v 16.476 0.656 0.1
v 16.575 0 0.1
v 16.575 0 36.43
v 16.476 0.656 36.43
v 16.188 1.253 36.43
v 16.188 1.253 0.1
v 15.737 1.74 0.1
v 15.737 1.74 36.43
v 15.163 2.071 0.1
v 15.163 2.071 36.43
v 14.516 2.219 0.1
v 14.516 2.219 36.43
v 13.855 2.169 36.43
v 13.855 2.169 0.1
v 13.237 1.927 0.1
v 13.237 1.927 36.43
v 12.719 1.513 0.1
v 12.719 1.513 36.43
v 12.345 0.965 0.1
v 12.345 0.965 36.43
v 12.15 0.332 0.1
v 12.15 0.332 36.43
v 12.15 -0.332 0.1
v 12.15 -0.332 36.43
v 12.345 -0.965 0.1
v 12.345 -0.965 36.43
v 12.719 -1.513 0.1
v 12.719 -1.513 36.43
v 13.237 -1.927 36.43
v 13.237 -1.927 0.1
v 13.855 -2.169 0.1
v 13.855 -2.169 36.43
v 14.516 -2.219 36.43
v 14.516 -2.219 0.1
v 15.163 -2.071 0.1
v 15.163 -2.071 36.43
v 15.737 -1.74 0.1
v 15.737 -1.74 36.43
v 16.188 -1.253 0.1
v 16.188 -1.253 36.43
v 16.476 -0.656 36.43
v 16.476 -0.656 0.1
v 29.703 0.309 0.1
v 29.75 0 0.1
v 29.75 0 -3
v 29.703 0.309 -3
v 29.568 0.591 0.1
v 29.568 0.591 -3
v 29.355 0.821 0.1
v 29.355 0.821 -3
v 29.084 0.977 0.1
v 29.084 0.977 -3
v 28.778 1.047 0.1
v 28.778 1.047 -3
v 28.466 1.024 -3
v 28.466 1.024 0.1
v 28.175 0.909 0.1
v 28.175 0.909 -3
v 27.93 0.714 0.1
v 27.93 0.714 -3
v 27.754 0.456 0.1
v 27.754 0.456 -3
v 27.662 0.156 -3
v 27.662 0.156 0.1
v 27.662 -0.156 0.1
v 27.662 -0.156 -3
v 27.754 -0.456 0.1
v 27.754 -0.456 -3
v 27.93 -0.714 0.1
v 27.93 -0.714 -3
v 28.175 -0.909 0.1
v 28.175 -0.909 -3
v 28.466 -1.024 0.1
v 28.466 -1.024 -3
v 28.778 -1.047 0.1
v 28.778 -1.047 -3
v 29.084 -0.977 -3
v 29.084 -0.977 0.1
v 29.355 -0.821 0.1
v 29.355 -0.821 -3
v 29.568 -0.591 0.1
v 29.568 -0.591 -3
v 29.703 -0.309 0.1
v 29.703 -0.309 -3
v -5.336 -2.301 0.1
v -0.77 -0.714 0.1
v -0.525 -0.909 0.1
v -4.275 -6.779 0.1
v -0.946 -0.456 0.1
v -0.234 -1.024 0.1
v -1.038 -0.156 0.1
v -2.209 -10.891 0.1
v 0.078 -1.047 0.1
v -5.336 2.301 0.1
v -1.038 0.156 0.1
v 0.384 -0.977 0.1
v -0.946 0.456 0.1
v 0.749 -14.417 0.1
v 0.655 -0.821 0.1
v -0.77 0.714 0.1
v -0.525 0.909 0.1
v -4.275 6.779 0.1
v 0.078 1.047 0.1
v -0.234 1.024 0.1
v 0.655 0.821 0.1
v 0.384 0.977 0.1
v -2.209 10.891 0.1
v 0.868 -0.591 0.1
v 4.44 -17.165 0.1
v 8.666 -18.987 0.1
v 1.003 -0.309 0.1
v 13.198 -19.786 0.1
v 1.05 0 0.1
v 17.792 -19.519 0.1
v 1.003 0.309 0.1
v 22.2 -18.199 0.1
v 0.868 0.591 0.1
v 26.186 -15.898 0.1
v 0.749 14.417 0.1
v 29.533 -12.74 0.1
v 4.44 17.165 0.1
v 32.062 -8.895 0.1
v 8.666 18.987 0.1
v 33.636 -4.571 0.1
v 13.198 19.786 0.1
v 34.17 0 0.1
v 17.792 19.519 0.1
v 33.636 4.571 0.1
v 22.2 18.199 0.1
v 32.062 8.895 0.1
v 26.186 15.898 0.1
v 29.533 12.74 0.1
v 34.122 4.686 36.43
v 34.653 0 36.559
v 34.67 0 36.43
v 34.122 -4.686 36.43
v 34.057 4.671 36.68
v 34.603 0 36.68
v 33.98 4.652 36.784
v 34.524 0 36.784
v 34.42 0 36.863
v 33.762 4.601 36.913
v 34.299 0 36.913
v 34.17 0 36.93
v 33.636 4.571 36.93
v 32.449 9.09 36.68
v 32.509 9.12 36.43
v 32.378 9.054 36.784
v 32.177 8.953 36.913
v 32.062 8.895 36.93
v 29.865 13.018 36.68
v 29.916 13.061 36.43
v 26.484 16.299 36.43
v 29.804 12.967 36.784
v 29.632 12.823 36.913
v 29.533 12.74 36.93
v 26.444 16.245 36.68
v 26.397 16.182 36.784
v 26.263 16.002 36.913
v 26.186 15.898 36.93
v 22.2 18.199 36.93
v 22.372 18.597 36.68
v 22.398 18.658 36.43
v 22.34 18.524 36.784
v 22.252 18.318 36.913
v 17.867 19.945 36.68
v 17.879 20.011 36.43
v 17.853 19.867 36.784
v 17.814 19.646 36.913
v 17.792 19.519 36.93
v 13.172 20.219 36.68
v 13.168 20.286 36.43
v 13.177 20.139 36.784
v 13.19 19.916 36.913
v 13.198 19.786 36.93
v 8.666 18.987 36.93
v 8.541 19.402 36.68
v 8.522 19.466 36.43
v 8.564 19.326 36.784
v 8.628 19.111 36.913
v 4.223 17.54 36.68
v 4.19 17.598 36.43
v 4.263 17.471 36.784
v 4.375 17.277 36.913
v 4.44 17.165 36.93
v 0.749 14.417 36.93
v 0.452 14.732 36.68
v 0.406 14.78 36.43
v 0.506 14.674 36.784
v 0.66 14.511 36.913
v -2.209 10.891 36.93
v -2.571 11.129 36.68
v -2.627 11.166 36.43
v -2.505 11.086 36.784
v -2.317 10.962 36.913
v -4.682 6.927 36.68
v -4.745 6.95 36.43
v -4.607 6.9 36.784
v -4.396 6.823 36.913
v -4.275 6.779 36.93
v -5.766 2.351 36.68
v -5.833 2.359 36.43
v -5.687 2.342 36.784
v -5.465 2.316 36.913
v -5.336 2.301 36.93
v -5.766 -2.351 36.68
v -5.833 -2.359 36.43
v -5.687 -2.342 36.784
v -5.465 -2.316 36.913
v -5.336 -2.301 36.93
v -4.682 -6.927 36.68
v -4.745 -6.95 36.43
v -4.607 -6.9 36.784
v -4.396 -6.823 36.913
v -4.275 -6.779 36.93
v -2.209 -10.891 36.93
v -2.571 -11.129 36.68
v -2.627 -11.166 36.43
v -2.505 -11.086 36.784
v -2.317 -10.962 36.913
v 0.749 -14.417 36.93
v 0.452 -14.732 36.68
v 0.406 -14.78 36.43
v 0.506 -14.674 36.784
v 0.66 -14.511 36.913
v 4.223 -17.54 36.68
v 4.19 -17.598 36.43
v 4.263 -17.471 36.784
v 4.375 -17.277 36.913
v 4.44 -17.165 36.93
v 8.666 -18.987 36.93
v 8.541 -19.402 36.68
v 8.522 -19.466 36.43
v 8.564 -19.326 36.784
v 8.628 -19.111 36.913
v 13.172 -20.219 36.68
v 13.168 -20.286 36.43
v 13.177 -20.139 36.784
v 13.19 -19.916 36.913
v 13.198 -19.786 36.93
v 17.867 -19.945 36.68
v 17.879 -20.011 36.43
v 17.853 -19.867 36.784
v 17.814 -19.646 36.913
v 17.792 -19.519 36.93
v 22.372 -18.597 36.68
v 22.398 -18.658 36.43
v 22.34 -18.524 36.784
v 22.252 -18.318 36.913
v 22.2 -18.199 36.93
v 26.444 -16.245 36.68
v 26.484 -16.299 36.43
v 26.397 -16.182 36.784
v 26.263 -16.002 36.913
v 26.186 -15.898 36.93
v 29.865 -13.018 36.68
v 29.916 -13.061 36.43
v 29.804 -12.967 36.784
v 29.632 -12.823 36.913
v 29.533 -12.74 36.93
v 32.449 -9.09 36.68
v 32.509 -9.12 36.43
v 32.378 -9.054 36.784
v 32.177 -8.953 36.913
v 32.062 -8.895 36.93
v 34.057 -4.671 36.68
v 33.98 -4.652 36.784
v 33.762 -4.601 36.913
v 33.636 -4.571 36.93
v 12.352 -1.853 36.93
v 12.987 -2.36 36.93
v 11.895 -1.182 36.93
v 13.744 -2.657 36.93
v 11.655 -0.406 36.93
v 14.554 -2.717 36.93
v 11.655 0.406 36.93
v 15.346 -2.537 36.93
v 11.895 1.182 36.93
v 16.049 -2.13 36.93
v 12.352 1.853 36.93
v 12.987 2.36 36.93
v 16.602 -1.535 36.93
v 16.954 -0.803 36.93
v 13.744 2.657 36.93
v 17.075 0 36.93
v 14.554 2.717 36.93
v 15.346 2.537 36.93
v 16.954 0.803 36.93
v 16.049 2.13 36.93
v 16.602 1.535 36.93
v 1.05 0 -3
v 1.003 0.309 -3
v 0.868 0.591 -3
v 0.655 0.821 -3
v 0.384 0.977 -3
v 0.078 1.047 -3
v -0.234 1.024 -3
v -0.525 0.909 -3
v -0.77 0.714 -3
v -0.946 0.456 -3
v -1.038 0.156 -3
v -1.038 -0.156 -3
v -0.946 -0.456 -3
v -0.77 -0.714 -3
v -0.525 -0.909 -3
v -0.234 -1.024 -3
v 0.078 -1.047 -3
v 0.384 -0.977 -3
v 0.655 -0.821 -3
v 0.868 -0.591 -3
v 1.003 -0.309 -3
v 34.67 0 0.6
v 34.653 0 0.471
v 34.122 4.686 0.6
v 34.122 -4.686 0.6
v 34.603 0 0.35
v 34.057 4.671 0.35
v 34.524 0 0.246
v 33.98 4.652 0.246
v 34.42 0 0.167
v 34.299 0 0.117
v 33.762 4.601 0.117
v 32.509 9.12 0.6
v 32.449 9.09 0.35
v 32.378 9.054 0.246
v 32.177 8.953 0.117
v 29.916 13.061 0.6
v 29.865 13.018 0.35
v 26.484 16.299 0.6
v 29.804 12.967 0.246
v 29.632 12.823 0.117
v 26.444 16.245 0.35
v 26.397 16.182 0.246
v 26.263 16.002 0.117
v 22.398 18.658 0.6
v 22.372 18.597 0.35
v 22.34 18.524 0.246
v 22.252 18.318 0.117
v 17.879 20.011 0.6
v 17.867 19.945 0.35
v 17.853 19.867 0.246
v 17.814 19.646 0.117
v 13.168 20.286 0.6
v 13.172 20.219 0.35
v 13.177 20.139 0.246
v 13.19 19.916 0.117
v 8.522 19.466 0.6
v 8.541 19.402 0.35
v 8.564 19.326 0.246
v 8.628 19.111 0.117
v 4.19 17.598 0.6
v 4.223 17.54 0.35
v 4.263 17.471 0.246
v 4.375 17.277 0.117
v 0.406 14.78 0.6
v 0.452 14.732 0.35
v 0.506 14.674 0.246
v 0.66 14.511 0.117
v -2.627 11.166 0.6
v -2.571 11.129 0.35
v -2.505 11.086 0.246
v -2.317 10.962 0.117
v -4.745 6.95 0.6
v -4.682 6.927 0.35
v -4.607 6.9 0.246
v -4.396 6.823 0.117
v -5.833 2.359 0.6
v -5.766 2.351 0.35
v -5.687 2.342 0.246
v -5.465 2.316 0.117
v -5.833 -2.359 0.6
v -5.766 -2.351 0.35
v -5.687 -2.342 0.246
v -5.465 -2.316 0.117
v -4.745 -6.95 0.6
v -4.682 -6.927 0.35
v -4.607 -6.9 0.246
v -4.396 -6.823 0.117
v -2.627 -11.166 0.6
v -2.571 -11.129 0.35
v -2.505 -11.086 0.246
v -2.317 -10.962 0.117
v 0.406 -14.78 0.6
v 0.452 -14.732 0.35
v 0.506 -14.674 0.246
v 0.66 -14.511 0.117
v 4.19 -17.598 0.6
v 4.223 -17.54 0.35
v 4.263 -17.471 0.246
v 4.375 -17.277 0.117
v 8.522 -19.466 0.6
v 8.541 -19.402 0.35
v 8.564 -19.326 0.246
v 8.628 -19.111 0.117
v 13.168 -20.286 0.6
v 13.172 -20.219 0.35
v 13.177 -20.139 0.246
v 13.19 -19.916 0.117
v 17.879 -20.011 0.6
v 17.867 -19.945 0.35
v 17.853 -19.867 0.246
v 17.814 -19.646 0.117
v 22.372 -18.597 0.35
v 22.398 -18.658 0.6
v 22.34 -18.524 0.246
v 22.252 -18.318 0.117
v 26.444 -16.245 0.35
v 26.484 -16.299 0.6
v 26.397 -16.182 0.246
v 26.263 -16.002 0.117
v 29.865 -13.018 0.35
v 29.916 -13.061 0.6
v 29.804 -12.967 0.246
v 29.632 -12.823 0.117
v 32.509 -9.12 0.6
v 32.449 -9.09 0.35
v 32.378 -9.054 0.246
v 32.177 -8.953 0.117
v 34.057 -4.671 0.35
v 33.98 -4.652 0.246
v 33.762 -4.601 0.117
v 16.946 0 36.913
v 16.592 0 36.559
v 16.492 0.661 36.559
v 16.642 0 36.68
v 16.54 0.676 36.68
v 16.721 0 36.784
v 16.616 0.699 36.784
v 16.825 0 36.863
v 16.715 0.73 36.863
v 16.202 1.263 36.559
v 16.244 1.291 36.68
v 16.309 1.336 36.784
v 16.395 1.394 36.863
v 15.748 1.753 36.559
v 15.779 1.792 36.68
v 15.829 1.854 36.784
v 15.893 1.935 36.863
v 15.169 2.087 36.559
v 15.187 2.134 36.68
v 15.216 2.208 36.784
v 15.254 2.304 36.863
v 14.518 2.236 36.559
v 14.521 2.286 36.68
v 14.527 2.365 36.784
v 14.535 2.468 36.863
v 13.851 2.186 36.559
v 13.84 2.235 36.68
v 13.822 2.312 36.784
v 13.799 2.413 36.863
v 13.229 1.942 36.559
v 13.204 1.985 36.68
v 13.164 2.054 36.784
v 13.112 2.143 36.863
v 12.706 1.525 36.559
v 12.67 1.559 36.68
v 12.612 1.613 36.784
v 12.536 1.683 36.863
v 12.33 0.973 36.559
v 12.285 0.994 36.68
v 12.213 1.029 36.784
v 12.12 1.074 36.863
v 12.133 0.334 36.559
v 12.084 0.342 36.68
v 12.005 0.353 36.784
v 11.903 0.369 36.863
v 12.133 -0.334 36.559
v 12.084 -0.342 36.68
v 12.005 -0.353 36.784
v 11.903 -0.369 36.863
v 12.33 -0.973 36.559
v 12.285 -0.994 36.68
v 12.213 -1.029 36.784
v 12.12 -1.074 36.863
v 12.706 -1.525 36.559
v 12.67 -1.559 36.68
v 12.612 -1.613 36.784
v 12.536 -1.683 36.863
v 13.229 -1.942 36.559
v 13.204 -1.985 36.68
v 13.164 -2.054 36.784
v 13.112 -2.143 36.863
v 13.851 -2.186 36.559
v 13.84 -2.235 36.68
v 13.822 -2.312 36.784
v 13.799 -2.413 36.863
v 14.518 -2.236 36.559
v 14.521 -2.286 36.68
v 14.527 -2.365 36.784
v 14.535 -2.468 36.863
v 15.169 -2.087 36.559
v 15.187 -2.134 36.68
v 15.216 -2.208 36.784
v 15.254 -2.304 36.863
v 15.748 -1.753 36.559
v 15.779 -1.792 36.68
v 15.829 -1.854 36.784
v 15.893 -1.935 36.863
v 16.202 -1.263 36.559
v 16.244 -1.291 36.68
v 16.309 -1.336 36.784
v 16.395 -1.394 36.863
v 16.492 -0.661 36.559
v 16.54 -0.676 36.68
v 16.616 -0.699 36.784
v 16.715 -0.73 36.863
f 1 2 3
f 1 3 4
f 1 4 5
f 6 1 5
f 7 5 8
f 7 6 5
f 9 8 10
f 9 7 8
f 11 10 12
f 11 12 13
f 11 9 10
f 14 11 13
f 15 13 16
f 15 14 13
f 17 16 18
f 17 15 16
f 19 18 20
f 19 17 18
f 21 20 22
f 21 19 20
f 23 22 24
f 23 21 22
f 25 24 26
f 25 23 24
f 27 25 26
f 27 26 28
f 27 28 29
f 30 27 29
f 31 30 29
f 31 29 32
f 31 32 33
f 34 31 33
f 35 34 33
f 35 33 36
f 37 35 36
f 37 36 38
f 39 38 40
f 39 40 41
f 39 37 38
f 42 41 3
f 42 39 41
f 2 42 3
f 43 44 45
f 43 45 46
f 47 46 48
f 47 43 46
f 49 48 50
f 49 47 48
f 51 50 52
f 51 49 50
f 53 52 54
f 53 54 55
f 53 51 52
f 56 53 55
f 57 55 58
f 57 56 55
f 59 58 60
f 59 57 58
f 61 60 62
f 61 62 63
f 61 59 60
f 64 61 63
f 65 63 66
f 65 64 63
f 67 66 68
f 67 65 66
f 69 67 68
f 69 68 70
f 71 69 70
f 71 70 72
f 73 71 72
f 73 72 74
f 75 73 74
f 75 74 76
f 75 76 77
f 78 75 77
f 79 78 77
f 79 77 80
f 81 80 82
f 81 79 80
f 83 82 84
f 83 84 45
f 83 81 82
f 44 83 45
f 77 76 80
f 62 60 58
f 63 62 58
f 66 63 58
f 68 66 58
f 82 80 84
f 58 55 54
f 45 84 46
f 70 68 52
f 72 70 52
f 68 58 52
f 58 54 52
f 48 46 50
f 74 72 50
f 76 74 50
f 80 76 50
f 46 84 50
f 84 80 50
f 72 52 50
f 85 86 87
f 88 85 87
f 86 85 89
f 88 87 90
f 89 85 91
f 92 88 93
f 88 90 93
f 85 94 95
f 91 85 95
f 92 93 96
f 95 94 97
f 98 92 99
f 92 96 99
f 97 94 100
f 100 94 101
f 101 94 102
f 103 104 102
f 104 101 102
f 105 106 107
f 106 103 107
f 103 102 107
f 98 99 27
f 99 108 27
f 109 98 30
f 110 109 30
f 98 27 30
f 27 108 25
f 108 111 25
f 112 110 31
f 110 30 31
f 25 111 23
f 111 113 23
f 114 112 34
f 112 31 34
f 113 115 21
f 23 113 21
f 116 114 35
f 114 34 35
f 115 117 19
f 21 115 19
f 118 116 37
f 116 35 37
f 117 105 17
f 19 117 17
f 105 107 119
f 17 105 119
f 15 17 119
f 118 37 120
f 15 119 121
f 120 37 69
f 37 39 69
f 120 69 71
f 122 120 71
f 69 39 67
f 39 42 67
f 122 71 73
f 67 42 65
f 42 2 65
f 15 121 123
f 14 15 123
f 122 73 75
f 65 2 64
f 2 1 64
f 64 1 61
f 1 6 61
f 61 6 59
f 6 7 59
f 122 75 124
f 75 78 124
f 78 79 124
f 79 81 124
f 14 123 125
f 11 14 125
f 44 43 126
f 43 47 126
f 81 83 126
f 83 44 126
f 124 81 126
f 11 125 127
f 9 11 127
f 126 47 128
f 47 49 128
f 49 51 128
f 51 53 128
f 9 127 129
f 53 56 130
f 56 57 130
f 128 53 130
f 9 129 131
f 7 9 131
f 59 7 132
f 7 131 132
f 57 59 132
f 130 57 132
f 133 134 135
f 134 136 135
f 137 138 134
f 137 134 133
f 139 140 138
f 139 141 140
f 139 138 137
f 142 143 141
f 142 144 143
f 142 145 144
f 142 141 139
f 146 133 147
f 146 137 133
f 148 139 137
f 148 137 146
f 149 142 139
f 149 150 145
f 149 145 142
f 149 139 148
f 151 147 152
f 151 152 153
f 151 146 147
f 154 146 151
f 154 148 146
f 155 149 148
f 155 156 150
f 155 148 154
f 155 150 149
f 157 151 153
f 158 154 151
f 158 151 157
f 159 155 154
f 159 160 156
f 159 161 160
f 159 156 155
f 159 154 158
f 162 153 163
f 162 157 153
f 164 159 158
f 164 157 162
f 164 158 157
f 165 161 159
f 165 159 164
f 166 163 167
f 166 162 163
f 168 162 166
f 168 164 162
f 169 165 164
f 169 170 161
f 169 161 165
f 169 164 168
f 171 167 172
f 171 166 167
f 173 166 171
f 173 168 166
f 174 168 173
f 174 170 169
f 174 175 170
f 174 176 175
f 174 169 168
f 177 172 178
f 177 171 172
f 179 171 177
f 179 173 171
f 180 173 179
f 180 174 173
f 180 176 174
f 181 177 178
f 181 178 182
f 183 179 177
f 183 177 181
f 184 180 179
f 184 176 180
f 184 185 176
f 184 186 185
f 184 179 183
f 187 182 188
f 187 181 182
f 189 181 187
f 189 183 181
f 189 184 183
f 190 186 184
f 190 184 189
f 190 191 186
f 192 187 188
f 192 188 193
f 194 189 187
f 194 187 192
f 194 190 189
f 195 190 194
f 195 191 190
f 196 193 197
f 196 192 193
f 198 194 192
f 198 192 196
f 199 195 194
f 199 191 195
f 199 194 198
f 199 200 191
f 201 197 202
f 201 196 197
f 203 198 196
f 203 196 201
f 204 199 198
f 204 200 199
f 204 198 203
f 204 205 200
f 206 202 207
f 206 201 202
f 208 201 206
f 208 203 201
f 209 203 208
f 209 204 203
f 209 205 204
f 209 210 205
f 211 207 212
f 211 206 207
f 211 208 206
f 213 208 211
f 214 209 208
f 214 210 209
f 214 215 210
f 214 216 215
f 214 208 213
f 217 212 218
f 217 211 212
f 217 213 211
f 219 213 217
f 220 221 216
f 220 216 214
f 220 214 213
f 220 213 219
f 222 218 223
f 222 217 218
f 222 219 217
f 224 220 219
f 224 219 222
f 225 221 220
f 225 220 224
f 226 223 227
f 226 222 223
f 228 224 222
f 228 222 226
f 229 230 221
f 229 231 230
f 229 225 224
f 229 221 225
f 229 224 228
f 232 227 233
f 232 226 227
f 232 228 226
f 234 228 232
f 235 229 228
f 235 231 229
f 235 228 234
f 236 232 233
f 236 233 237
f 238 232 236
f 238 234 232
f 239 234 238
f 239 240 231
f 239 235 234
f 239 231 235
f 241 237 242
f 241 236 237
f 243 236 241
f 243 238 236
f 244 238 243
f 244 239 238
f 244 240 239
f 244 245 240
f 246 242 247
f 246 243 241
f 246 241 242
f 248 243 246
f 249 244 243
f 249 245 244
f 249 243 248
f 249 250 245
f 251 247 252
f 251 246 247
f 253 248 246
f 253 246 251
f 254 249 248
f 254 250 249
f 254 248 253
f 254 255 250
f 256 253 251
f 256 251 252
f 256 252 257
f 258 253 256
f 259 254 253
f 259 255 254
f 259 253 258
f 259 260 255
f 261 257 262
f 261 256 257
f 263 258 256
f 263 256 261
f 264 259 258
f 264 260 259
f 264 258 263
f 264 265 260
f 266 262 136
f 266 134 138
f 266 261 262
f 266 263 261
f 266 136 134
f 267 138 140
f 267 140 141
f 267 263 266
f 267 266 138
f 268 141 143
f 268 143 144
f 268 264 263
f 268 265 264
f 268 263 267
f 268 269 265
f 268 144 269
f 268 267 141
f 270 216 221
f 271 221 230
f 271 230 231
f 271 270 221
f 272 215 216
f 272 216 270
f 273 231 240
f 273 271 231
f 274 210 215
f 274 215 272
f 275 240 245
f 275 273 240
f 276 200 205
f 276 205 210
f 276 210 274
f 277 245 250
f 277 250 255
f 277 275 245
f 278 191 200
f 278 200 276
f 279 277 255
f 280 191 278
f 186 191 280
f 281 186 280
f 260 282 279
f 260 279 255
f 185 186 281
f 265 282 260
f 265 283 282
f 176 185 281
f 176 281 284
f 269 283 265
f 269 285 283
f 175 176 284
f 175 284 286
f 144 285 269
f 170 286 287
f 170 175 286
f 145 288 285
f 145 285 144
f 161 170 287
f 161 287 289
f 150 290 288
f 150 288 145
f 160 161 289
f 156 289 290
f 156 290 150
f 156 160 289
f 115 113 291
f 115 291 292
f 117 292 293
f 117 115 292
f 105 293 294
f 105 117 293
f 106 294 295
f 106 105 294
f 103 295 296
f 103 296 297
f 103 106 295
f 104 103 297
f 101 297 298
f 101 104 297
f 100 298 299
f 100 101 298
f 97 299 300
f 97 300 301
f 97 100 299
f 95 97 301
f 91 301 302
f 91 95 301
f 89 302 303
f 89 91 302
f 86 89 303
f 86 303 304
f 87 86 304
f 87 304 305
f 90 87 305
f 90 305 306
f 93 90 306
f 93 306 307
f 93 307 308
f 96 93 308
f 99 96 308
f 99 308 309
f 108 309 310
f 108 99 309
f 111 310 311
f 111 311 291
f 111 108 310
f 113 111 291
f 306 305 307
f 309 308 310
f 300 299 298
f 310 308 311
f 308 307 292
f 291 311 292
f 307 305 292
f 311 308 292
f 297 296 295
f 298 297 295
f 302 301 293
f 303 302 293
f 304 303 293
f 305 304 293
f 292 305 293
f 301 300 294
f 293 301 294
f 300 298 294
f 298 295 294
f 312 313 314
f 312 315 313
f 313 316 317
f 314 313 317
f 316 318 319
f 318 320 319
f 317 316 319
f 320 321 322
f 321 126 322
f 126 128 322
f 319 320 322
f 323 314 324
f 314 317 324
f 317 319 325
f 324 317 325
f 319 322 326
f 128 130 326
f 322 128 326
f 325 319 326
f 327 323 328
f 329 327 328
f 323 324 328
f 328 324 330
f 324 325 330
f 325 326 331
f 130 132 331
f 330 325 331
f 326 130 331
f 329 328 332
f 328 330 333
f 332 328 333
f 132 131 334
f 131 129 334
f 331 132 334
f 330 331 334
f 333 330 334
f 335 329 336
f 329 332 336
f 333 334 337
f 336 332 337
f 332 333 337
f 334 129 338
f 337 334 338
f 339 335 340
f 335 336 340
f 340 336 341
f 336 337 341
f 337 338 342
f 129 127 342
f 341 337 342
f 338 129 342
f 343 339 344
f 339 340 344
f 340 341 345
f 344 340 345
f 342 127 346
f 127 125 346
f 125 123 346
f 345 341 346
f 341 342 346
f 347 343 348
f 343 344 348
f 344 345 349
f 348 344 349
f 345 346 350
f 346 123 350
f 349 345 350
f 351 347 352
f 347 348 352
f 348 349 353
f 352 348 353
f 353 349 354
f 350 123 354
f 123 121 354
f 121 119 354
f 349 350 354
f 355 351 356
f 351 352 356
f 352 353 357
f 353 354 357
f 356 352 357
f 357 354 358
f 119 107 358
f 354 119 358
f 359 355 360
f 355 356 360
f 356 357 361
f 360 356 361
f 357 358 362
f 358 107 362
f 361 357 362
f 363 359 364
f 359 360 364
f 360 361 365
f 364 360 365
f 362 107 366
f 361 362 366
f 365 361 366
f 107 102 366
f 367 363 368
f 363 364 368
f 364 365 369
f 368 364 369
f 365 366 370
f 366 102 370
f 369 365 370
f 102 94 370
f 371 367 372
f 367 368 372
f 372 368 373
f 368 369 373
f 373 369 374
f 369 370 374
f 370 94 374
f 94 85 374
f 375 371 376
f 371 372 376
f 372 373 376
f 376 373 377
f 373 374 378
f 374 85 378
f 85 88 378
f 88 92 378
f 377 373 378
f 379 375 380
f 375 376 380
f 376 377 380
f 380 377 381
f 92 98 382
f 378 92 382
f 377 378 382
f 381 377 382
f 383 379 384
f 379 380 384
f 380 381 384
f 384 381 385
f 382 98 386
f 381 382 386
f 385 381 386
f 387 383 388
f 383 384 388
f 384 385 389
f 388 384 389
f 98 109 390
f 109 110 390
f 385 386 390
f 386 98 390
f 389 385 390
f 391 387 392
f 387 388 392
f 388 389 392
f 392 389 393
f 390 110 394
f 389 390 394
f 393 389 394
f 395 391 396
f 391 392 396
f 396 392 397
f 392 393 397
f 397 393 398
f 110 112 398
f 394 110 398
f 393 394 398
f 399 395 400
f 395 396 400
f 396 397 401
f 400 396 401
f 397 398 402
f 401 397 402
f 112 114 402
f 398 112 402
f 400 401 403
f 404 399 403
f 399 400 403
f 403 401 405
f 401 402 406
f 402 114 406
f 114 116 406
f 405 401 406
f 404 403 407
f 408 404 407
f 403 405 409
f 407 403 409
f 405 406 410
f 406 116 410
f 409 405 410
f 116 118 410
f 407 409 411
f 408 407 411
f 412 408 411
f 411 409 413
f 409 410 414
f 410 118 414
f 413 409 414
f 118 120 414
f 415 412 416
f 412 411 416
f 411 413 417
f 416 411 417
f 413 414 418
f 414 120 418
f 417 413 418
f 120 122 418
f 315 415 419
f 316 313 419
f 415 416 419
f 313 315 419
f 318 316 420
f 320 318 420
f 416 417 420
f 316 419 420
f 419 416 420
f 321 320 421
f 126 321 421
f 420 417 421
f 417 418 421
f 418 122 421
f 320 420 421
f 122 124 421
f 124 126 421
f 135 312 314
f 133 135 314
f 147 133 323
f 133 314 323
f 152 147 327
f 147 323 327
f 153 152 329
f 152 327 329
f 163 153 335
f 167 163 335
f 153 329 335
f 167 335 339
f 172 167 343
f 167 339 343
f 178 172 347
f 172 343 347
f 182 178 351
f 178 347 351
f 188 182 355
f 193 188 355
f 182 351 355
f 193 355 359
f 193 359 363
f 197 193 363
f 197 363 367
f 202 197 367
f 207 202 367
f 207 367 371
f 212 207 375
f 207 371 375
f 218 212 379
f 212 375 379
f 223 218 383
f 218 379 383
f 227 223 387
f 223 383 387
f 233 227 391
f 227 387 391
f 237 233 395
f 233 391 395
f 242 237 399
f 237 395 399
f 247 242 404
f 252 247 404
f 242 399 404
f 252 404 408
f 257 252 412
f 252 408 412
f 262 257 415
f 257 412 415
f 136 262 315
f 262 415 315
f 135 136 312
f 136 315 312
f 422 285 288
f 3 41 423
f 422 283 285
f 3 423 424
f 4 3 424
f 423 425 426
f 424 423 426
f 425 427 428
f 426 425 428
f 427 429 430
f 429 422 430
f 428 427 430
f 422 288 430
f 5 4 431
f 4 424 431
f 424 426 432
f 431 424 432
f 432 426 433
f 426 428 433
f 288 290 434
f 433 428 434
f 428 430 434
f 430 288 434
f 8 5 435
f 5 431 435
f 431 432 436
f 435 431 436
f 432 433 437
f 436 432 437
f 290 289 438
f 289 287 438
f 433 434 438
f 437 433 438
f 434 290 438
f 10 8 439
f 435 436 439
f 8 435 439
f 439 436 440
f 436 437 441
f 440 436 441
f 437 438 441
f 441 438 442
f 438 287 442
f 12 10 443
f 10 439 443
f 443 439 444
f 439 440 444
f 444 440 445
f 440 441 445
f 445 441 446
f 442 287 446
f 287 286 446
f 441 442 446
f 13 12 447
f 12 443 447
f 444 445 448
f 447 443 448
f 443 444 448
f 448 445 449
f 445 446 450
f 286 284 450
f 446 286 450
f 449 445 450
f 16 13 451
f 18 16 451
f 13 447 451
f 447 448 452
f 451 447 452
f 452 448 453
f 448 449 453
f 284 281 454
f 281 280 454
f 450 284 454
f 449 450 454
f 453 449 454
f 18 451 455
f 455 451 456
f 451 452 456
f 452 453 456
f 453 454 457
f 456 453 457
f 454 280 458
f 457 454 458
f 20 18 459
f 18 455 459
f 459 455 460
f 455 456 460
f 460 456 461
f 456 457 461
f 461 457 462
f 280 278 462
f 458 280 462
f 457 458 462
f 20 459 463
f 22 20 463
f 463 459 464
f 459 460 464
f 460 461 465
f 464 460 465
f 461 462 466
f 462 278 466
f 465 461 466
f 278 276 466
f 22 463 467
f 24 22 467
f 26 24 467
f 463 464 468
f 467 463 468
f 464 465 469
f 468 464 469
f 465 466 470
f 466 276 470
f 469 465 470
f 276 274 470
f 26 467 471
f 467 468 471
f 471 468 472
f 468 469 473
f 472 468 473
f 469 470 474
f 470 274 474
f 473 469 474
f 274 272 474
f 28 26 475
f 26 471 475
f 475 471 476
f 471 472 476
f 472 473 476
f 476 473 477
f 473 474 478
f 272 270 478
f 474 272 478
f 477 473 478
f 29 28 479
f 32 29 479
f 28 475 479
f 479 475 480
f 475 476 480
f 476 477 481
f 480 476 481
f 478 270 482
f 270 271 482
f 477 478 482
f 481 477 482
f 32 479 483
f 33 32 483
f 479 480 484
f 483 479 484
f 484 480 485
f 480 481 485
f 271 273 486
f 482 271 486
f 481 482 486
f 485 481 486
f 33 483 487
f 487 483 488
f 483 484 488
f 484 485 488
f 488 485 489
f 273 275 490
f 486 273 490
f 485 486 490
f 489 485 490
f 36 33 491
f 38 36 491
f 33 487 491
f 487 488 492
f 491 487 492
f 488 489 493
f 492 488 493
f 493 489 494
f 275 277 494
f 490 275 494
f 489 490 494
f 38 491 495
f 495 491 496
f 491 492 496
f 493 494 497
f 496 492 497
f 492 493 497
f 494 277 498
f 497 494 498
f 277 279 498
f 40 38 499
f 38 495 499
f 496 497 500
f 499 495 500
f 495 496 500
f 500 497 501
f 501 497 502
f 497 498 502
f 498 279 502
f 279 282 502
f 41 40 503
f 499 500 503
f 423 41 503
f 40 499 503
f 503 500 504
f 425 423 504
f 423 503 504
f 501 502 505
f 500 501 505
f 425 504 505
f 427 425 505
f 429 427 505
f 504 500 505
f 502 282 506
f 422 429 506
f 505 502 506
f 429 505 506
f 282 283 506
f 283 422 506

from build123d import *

# Parameters (mm, degrees)
SKETCH_R          = 20.32
SKETCH_R_2        = 2.225
PAD_DEPTH         = 36.83
FILLET_R          = 0.5
SKETCH001_R       = 1.05
PAD001_DEPTH      = 18.415
PAD001_DEPTH_BACK = 3.5


with BuildPart() as fillet_body:
    # Sketch → Pad (new body)
    with BuildSketch(Plane.XY.offset(0.1)):
        with Locations((14.35, 0)):
            Circle(SKETCH_R)
        with Locations((14.35, 0)):
            Circle(SKETCH_R_2, mode=Mode.SUBTRACT)
    extrude(amount=PAD_DEPTH)

    # Fillet
    fillet_edges = [fillet_body.edges().sort_by_distance(p)[0] for p in [
        (12.125, 0, 36.93),
        (-5.97, 0, 36.93),
        (-5.97, 0, 0.1),
    ]]
    fillet(fillet_edges, radius=FILLET_R)


with BuildPart() as pad001_mp_cp:
    # Sketch001 → Pad001 (new body, two sides)
    with BuildSketch(Plane.XY.offset(0.5)) as pad001_sk:
        Circle(SKETCH001_R)
        with Locations((28.7, 0)):
            Circle(SKETCH001_R)
    extrude(amount=PAD001_DEPTH)
    extrude(pad001_sk.sketch, amount=-PAD001_DEPTH_BACK)

    # Pad001_mp_cp: union Fillet body
    add(fillet_body.part)


solid = pad001_mp_cp.part
